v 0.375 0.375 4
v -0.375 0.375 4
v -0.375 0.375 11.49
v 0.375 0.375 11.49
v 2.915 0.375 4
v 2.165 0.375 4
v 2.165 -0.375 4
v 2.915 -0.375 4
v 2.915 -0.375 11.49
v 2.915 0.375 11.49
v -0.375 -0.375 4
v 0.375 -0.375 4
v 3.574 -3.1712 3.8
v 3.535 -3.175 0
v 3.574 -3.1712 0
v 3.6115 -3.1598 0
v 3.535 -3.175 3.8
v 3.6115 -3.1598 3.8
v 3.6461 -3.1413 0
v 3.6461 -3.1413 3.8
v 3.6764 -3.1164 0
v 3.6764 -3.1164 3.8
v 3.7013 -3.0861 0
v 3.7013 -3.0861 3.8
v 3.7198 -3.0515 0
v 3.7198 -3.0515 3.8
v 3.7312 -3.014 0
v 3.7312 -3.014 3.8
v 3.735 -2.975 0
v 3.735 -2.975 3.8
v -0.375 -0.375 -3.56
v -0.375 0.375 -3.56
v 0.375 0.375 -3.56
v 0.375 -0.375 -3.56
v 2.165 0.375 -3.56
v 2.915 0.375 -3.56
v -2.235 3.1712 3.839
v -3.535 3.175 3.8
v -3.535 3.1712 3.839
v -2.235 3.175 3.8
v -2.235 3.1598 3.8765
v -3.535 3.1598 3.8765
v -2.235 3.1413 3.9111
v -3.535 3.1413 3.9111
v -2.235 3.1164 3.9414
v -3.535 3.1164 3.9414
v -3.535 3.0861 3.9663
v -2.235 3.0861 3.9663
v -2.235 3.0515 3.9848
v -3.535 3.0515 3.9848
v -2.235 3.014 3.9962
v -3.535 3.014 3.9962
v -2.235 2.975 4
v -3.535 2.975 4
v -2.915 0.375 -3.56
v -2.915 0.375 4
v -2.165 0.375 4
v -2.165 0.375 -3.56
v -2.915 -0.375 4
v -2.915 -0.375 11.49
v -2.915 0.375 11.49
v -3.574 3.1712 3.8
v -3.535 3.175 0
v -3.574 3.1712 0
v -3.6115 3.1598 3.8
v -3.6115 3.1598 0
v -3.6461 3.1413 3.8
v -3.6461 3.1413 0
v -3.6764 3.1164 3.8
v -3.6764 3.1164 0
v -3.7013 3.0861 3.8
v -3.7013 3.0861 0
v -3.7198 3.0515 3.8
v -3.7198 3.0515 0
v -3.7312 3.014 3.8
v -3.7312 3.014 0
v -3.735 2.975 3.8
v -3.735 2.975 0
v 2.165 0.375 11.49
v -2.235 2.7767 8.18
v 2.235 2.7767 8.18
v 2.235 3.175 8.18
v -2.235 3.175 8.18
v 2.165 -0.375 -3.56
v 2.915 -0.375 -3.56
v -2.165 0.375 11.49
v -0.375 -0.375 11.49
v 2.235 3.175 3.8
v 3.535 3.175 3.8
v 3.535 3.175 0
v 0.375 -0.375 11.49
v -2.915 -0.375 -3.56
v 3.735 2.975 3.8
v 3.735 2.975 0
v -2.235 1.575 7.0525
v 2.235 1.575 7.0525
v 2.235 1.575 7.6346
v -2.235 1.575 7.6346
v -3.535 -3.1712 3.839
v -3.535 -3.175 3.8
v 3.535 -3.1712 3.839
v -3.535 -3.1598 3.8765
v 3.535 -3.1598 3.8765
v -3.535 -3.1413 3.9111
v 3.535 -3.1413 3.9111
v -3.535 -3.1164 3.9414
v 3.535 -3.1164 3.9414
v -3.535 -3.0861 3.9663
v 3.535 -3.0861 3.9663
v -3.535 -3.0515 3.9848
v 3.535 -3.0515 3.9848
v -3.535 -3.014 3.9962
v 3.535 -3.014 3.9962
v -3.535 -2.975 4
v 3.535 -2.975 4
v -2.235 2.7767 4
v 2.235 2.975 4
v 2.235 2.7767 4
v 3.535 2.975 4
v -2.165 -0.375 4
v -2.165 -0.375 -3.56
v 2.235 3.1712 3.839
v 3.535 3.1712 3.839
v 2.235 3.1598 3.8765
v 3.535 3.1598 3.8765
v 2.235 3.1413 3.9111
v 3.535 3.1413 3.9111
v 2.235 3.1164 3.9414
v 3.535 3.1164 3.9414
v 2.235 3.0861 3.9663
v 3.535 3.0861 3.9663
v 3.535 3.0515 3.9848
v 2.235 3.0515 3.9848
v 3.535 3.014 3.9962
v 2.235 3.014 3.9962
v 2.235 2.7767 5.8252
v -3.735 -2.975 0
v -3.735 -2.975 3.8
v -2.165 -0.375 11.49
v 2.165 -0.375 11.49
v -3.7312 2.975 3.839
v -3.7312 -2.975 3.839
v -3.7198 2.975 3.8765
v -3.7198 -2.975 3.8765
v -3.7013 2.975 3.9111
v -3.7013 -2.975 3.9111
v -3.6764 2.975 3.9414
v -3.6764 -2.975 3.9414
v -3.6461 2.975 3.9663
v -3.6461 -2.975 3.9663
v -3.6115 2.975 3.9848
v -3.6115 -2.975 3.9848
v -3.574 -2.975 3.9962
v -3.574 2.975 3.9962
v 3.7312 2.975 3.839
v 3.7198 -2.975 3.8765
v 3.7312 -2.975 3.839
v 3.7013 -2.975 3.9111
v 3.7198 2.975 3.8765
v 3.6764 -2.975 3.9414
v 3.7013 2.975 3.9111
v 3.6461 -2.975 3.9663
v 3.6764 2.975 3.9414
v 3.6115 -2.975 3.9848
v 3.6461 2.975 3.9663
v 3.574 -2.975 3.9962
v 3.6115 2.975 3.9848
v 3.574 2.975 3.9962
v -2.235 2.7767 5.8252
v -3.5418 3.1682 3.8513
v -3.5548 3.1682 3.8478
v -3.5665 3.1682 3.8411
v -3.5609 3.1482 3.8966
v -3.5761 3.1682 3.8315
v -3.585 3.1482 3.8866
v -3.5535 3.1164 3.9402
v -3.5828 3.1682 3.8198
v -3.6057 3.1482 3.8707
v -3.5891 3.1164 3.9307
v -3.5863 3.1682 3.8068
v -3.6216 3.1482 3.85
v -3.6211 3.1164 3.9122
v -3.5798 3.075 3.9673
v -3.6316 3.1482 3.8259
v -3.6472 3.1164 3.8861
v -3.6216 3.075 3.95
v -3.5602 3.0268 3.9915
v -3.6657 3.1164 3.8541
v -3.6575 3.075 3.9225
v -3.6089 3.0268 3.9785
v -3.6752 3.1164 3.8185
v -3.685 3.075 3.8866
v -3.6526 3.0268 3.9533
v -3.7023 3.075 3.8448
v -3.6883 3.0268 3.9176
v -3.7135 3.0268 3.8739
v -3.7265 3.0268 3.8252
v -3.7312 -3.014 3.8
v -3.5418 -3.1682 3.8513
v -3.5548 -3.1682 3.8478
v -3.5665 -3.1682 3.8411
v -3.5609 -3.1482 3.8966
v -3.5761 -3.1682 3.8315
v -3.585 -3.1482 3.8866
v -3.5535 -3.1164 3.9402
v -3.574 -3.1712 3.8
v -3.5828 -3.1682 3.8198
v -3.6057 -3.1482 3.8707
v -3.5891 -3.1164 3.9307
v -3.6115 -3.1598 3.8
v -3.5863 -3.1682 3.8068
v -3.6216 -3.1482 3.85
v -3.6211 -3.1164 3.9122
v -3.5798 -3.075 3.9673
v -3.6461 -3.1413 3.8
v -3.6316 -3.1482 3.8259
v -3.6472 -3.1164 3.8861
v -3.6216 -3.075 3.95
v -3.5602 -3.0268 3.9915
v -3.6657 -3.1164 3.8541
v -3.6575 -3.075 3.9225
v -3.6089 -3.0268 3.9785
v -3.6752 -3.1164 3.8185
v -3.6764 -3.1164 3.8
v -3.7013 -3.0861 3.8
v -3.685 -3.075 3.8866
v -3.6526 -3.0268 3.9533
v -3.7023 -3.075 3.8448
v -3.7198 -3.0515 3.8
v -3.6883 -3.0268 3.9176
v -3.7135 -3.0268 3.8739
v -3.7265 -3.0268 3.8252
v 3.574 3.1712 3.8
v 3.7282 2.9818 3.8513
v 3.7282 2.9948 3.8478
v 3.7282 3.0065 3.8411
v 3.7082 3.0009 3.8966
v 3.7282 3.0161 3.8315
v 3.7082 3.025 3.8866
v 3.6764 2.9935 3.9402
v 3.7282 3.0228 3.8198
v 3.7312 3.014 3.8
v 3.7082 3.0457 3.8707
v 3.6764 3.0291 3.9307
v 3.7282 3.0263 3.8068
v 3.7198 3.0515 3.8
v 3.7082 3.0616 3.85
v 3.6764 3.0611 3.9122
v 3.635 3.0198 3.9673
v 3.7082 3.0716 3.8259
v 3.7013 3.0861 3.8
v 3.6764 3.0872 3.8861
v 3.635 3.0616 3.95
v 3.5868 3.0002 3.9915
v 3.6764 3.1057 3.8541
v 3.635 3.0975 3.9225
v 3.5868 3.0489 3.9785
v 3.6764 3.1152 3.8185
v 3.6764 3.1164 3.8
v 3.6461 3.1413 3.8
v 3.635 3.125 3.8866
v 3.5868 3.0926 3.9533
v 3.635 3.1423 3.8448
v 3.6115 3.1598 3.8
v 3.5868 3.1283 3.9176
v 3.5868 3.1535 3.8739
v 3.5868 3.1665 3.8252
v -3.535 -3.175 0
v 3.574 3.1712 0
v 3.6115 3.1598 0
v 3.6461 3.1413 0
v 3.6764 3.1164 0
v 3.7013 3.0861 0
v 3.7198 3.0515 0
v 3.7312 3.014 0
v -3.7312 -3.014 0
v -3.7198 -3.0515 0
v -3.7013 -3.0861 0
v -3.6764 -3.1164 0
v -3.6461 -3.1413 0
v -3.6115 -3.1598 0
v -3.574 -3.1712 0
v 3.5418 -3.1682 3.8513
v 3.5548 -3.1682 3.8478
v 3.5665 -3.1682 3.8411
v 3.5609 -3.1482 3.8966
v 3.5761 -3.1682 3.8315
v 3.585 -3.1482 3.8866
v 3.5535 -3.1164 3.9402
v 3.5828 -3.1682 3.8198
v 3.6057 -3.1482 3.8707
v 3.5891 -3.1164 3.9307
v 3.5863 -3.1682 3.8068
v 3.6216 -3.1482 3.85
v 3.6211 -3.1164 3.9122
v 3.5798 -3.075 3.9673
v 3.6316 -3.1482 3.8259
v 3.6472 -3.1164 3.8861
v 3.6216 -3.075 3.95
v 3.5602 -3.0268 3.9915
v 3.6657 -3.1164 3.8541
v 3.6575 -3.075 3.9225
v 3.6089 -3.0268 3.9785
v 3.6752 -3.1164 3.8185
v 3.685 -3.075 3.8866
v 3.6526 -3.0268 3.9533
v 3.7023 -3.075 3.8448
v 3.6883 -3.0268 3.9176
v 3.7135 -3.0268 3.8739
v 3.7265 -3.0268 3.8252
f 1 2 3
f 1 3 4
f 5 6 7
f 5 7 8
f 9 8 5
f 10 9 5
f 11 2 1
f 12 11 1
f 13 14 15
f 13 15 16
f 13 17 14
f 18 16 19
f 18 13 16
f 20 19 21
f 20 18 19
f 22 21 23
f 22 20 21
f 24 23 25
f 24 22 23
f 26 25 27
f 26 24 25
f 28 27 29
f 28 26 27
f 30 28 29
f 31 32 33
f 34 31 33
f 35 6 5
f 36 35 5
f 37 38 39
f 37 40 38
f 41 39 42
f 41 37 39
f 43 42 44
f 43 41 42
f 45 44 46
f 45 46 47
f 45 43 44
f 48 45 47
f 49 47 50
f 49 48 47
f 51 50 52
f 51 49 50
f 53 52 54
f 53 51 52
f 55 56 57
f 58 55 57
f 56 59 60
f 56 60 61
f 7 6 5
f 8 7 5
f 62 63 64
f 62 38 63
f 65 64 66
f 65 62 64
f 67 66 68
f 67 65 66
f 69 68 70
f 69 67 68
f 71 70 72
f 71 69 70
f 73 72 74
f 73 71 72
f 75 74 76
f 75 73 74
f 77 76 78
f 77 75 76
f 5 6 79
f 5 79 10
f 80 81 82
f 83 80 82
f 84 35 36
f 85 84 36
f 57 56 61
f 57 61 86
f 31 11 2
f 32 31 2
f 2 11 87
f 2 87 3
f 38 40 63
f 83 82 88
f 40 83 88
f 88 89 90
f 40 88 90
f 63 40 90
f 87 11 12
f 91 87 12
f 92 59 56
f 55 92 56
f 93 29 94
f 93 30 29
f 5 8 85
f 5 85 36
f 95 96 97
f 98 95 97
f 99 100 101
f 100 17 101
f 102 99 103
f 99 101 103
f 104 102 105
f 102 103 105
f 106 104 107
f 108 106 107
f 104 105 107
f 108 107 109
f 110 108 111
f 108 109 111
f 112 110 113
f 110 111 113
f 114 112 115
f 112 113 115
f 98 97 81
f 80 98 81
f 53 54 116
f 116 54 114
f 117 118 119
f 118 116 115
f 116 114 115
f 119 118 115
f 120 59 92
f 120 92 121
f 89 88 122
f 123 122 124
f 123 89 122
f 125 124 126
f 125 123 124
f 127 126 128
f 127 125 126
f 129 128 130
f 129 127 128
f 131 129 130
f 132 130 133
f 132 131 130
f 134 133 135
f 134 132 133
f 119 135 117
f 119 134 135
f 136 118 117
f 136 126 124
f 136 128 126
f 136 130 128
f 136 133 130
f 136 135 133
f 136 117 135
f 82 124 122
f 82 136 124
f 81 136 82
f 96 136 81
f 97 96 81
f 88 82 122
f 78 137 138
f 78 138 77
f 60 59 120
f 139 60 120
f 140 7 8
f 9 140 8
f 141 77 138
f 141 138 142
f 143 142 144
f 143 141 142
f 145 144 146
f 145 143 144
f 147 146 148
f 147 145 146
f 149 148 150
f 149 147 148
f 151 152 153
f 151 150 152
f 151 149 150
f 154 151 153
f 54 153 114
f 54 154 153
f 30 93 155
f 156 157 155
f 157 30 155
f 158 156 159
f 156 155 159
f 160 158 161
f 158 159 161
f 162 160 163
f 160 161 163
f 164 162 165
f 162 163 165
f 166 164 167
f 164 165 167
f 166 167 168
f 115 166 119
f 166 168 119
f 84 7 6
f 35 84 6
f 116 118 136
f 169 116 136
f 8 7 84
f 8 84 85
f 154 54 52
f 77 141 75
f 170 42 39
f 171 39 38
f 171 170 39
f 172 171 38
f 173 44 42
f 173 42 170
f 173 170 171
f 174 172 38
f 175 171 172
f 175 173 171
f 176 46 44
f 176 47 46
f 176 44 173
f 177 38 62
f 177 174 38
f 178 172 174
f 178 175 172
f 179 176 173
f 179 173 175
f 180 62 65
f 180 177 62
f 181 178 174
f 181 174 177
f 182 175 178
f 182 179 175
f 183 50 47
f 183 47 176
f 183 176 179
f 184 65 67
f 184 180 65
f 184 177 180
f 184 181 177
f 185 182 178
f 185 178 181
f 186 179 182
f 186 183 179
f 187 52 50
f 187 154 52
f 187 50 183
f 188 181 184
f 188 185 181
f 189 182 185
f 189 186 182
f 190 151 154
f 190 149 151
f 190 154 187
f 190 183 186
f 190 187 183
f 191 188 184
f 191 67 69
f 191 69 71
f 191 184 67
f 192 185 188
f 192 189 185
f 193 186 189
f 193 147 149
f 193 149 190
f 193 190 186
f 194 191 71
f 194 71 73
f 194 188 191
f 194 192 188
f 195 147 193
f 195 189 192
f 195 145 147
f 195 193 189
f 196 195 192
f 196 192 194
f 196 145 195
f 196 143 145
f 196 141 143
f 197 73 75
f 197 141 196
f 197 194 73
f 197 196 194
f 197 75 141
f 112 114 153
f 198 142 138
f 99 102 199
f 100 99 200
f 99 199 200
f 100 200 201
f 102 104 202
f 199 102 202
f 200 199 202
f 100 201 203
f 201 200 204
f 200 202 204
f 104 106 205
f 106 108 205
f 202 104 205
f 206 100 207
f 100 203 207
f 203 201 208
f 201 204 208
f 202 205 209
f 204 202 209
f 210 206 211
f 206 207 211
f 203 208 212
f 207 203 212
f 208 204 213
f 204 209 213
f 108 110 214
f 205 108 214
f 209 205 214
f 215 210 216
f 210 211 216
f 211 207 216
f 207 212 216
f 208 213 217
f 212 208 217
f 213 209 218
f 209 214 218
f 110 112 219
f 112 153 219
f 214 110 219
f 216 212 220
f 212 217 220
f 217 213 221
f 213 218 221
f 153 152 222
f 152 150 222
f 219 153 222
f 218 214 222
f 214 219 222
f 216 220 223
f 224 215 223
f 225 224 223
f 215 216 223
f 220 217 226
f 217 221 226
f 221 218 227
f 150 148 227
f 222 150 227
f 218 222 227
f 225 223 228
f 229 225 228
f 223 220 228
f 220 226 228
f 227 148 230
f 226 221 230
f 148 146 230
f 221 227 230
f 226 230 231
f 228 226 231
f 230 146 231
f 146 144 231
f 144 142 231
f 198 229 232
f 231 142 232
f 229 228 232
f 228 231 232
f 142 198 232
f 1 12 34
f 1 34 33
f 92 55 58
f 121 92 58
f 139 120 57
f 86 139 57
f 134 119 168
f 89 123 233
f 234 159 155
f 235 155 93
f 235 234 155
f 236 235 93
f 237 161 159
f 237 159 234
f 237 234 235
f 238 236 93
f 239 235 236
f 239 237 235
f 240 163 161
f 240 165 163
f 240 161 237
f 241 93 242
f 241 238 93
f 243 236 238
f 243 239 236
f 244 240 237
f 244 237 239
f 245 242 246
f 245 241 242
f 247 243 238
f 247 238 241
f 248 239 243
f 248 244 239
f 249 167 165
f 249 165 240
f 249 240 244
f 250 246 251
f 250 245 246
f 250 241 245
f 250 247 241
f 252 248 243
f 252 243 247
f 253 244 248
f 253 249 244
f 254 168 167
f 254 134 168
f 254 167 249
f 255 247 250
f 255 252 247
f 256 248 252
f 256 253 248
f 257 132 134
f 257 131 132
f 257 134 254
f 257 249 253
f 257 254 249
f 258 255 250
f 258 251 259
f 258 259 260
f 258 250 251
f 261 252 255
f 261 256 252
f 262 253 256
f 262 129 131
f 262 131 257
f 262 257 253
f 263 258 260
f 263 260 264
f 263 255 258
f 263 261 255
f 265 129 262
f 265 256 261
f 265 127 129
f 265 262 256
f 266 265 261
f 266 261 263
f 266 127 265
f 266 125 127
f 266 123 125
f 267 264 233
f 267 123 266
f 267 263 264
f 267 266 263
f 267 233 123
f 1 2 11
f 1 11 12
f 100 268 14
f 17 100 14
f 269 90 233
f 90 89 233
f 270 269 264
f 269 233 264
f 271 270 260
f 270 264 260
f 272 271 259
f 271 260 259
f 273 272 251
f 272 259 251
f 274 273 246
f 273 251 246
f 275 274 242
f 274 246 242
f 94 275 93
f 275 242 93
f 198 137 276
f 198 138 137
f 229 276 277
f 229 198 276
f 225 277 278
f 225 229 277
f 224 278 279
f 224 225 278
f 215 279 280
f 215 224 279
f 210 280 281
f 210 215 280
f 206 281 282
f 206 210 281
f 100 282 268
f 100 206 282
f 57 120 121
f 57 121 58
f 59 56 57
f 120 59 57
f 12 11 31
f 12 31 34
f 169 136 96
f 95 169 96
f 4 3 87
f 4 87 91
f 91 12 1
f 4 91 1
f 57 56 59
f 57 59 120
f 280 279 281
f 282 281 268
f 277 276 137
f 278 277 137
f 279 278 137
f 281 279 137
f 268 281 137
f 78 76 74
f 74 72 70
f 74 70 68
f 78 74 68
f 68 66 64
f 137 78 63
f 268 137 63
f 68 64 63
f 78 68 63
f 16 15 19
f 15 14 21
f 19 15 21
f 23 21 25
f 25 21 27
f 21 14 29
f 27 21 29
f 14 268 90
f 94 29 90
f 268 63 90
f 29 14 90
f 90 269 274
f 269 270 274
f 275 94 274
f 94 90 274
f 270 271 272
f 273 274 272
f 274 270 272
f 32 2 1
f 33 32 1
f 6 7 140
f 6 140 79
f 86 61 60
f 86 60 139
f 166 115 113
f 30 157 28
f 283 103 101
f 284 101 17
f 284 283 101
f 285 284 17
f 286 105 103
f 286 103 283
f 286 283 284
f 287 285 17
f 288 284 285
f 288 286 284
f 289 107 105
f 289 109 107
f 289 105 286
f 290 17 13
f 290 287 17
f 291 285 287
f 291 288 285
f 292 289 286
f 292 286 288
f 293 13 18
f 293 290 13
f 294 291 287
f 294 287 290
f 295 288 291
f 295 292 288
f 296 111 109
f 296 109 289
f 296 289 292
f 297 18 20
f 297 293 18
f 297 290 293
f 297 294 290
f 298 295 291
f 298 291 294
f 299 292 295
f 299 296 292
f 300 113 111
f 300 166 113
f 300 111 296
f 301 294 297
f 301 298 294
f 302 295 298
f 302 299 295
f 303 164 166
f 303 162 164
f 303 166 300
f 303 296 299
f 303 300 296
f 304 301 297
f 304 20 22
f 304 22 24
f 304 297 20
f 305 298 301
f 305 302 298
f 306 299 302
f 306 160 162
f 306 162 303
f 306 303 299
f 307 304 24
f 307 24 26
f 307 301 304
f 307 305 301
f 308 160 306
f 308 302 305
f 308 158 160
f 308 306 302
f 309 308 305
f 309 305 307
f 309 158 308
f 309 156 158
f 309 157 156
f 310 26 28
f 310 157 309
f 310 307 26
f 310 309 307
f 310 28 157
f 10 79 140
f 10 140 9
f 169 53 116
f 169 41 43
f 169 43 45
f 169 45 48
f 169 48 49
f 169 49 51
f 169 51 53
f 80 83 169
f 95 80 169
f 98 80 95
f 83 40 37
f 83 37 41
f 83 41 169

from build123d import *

# Parameters (mm, degrees)
F0_W      = 7.47
F0_H      = 6.35
F1_DEPTH  = 4
F2_W      = 1.6
F2_H      = 4.18
F3_DEPTH  = 1.5
F5_DEPTH  = 4.47
F6_W      = 1.5
F6_H      = 4.18
F7_DEPTH  = 25
F8_R      = 0.2
F9_W      = 0.75
F9_H      = 0.75
F10_DEPTH = 7.49
F11_DEPTH = 7.56


with BuildPart() as f1:
    # F0 (on Top) → F1 (new body)
    with BuildSketch(Plane.XY):
        Rectangle(F0_W, F0_H)
    extrude(amount=F1_DEPTH)

    # F2 (on face) → F3 (join)
    with BuildSketch(Plane.YZ.offset(3.735)):
        with Locations((2.375, 6.09)):
            Rectangle(F2_W, F2_H)
    extrude(amount=-F3_DEPTH)

    # F4 (on face) → F5 (join)
    with BuildSketch(Plane(origin=(2.235, 0, 0), x_dir=(0, -1, 0), z_dir=(-1, 0, 0))):
        Polygon((-3.175, 8.18), (-3.175, 4), (-2.7767212596, 4), (-2.7767212596, 5.8252010494), (-1.575, 7.0524699986), (-1.575, 7.6346360147), (-2.7767212596, 8.18), align=None)
    extrude(amount=F5_DEPTH)

    # F6 (on face) → F7 (cut)
    with BuildSketch(Plane.XZ.offset(-1.575)):
        with Locations((2.985, 6.09)):
            Rectangle(F6_W, F6_H)
    extrude(amount=-F7_DEPTH, mode=Mode.SUBTRACT)

    # F8
    f8_edges = [f1.edges().sort_by_distance(p)[0] for p in [
        (-3.735, 0, 4),
        (-2.985, 3.175, 4),
        (2.985, 3.175, 4),
        (3.735, 0, 4),
        (0, -3.175, 4),
        (-3.735, -3.175, 2),
        (3.735, -3.175, 2),
        (-3.735, 3.175, 2),
        (3.735, 3.175, 2),
    ]]
    fillet(f8_edges, radius=F8_R)


with BuildPart() as f10:
    # F9 (on face) → F10 (new body)
    with BuildSketch(Plane.XY.offset(4)):
        Rectangle(F9_W, F9_H)
    extrude(amount=F10_DEPTH)


with BuildPart() as f10b:
    # F9 (on face) → F10, piece 2 (new body)
    with BuildSketch(Plane.XY.offset(4)):
        with Locations((2.54, 0)):
            Rectangle(F9_W, F9_H)
    extrude(amount=F10_DEPTH)


with BuildPart() as f10c:
    # F9 (on face) → F10, piece 3 (new body)
    with BuildSketch(Plane.XY.offset(4)):
        with Locations((-2.54, 0)):
            Rectangle(F9_W, F9_H)
    extrude(amount=F10_DEPTH)


with BuildPart() as f11:
    # F9 (on face) → F11 (new body)
    with BuildSketch(Plane.XY.offset(4)):
        Rectangle(F9_W, F9_H)
    extrude(amount=-F11_DEPTH)


with BuildPart() as f11b:
    # F9 (on face) → F11, piece 2 (new body)
    with BuildSketch(Plane.XY.offset(4)):
        with Locations((2.54, 0)):
            Rectangle(F9_W, F9_H)
    extrude(amount=-F11_DEPTH)


with BuildPart() as f11c:
    # F9 (on face) → F11, piece 3 (new body)
    with BuildSketch(Plane.XY.offset(4)):
        with Locations((-2.54, 0)):
            Rectangle(F9_W, F9_H)
    extrude(amount=-F11_DEPTH)


solid = Compound([f1.part, f10.part, f10b.part, f10c.part, f11.part, f11b.part, f11c.part])
